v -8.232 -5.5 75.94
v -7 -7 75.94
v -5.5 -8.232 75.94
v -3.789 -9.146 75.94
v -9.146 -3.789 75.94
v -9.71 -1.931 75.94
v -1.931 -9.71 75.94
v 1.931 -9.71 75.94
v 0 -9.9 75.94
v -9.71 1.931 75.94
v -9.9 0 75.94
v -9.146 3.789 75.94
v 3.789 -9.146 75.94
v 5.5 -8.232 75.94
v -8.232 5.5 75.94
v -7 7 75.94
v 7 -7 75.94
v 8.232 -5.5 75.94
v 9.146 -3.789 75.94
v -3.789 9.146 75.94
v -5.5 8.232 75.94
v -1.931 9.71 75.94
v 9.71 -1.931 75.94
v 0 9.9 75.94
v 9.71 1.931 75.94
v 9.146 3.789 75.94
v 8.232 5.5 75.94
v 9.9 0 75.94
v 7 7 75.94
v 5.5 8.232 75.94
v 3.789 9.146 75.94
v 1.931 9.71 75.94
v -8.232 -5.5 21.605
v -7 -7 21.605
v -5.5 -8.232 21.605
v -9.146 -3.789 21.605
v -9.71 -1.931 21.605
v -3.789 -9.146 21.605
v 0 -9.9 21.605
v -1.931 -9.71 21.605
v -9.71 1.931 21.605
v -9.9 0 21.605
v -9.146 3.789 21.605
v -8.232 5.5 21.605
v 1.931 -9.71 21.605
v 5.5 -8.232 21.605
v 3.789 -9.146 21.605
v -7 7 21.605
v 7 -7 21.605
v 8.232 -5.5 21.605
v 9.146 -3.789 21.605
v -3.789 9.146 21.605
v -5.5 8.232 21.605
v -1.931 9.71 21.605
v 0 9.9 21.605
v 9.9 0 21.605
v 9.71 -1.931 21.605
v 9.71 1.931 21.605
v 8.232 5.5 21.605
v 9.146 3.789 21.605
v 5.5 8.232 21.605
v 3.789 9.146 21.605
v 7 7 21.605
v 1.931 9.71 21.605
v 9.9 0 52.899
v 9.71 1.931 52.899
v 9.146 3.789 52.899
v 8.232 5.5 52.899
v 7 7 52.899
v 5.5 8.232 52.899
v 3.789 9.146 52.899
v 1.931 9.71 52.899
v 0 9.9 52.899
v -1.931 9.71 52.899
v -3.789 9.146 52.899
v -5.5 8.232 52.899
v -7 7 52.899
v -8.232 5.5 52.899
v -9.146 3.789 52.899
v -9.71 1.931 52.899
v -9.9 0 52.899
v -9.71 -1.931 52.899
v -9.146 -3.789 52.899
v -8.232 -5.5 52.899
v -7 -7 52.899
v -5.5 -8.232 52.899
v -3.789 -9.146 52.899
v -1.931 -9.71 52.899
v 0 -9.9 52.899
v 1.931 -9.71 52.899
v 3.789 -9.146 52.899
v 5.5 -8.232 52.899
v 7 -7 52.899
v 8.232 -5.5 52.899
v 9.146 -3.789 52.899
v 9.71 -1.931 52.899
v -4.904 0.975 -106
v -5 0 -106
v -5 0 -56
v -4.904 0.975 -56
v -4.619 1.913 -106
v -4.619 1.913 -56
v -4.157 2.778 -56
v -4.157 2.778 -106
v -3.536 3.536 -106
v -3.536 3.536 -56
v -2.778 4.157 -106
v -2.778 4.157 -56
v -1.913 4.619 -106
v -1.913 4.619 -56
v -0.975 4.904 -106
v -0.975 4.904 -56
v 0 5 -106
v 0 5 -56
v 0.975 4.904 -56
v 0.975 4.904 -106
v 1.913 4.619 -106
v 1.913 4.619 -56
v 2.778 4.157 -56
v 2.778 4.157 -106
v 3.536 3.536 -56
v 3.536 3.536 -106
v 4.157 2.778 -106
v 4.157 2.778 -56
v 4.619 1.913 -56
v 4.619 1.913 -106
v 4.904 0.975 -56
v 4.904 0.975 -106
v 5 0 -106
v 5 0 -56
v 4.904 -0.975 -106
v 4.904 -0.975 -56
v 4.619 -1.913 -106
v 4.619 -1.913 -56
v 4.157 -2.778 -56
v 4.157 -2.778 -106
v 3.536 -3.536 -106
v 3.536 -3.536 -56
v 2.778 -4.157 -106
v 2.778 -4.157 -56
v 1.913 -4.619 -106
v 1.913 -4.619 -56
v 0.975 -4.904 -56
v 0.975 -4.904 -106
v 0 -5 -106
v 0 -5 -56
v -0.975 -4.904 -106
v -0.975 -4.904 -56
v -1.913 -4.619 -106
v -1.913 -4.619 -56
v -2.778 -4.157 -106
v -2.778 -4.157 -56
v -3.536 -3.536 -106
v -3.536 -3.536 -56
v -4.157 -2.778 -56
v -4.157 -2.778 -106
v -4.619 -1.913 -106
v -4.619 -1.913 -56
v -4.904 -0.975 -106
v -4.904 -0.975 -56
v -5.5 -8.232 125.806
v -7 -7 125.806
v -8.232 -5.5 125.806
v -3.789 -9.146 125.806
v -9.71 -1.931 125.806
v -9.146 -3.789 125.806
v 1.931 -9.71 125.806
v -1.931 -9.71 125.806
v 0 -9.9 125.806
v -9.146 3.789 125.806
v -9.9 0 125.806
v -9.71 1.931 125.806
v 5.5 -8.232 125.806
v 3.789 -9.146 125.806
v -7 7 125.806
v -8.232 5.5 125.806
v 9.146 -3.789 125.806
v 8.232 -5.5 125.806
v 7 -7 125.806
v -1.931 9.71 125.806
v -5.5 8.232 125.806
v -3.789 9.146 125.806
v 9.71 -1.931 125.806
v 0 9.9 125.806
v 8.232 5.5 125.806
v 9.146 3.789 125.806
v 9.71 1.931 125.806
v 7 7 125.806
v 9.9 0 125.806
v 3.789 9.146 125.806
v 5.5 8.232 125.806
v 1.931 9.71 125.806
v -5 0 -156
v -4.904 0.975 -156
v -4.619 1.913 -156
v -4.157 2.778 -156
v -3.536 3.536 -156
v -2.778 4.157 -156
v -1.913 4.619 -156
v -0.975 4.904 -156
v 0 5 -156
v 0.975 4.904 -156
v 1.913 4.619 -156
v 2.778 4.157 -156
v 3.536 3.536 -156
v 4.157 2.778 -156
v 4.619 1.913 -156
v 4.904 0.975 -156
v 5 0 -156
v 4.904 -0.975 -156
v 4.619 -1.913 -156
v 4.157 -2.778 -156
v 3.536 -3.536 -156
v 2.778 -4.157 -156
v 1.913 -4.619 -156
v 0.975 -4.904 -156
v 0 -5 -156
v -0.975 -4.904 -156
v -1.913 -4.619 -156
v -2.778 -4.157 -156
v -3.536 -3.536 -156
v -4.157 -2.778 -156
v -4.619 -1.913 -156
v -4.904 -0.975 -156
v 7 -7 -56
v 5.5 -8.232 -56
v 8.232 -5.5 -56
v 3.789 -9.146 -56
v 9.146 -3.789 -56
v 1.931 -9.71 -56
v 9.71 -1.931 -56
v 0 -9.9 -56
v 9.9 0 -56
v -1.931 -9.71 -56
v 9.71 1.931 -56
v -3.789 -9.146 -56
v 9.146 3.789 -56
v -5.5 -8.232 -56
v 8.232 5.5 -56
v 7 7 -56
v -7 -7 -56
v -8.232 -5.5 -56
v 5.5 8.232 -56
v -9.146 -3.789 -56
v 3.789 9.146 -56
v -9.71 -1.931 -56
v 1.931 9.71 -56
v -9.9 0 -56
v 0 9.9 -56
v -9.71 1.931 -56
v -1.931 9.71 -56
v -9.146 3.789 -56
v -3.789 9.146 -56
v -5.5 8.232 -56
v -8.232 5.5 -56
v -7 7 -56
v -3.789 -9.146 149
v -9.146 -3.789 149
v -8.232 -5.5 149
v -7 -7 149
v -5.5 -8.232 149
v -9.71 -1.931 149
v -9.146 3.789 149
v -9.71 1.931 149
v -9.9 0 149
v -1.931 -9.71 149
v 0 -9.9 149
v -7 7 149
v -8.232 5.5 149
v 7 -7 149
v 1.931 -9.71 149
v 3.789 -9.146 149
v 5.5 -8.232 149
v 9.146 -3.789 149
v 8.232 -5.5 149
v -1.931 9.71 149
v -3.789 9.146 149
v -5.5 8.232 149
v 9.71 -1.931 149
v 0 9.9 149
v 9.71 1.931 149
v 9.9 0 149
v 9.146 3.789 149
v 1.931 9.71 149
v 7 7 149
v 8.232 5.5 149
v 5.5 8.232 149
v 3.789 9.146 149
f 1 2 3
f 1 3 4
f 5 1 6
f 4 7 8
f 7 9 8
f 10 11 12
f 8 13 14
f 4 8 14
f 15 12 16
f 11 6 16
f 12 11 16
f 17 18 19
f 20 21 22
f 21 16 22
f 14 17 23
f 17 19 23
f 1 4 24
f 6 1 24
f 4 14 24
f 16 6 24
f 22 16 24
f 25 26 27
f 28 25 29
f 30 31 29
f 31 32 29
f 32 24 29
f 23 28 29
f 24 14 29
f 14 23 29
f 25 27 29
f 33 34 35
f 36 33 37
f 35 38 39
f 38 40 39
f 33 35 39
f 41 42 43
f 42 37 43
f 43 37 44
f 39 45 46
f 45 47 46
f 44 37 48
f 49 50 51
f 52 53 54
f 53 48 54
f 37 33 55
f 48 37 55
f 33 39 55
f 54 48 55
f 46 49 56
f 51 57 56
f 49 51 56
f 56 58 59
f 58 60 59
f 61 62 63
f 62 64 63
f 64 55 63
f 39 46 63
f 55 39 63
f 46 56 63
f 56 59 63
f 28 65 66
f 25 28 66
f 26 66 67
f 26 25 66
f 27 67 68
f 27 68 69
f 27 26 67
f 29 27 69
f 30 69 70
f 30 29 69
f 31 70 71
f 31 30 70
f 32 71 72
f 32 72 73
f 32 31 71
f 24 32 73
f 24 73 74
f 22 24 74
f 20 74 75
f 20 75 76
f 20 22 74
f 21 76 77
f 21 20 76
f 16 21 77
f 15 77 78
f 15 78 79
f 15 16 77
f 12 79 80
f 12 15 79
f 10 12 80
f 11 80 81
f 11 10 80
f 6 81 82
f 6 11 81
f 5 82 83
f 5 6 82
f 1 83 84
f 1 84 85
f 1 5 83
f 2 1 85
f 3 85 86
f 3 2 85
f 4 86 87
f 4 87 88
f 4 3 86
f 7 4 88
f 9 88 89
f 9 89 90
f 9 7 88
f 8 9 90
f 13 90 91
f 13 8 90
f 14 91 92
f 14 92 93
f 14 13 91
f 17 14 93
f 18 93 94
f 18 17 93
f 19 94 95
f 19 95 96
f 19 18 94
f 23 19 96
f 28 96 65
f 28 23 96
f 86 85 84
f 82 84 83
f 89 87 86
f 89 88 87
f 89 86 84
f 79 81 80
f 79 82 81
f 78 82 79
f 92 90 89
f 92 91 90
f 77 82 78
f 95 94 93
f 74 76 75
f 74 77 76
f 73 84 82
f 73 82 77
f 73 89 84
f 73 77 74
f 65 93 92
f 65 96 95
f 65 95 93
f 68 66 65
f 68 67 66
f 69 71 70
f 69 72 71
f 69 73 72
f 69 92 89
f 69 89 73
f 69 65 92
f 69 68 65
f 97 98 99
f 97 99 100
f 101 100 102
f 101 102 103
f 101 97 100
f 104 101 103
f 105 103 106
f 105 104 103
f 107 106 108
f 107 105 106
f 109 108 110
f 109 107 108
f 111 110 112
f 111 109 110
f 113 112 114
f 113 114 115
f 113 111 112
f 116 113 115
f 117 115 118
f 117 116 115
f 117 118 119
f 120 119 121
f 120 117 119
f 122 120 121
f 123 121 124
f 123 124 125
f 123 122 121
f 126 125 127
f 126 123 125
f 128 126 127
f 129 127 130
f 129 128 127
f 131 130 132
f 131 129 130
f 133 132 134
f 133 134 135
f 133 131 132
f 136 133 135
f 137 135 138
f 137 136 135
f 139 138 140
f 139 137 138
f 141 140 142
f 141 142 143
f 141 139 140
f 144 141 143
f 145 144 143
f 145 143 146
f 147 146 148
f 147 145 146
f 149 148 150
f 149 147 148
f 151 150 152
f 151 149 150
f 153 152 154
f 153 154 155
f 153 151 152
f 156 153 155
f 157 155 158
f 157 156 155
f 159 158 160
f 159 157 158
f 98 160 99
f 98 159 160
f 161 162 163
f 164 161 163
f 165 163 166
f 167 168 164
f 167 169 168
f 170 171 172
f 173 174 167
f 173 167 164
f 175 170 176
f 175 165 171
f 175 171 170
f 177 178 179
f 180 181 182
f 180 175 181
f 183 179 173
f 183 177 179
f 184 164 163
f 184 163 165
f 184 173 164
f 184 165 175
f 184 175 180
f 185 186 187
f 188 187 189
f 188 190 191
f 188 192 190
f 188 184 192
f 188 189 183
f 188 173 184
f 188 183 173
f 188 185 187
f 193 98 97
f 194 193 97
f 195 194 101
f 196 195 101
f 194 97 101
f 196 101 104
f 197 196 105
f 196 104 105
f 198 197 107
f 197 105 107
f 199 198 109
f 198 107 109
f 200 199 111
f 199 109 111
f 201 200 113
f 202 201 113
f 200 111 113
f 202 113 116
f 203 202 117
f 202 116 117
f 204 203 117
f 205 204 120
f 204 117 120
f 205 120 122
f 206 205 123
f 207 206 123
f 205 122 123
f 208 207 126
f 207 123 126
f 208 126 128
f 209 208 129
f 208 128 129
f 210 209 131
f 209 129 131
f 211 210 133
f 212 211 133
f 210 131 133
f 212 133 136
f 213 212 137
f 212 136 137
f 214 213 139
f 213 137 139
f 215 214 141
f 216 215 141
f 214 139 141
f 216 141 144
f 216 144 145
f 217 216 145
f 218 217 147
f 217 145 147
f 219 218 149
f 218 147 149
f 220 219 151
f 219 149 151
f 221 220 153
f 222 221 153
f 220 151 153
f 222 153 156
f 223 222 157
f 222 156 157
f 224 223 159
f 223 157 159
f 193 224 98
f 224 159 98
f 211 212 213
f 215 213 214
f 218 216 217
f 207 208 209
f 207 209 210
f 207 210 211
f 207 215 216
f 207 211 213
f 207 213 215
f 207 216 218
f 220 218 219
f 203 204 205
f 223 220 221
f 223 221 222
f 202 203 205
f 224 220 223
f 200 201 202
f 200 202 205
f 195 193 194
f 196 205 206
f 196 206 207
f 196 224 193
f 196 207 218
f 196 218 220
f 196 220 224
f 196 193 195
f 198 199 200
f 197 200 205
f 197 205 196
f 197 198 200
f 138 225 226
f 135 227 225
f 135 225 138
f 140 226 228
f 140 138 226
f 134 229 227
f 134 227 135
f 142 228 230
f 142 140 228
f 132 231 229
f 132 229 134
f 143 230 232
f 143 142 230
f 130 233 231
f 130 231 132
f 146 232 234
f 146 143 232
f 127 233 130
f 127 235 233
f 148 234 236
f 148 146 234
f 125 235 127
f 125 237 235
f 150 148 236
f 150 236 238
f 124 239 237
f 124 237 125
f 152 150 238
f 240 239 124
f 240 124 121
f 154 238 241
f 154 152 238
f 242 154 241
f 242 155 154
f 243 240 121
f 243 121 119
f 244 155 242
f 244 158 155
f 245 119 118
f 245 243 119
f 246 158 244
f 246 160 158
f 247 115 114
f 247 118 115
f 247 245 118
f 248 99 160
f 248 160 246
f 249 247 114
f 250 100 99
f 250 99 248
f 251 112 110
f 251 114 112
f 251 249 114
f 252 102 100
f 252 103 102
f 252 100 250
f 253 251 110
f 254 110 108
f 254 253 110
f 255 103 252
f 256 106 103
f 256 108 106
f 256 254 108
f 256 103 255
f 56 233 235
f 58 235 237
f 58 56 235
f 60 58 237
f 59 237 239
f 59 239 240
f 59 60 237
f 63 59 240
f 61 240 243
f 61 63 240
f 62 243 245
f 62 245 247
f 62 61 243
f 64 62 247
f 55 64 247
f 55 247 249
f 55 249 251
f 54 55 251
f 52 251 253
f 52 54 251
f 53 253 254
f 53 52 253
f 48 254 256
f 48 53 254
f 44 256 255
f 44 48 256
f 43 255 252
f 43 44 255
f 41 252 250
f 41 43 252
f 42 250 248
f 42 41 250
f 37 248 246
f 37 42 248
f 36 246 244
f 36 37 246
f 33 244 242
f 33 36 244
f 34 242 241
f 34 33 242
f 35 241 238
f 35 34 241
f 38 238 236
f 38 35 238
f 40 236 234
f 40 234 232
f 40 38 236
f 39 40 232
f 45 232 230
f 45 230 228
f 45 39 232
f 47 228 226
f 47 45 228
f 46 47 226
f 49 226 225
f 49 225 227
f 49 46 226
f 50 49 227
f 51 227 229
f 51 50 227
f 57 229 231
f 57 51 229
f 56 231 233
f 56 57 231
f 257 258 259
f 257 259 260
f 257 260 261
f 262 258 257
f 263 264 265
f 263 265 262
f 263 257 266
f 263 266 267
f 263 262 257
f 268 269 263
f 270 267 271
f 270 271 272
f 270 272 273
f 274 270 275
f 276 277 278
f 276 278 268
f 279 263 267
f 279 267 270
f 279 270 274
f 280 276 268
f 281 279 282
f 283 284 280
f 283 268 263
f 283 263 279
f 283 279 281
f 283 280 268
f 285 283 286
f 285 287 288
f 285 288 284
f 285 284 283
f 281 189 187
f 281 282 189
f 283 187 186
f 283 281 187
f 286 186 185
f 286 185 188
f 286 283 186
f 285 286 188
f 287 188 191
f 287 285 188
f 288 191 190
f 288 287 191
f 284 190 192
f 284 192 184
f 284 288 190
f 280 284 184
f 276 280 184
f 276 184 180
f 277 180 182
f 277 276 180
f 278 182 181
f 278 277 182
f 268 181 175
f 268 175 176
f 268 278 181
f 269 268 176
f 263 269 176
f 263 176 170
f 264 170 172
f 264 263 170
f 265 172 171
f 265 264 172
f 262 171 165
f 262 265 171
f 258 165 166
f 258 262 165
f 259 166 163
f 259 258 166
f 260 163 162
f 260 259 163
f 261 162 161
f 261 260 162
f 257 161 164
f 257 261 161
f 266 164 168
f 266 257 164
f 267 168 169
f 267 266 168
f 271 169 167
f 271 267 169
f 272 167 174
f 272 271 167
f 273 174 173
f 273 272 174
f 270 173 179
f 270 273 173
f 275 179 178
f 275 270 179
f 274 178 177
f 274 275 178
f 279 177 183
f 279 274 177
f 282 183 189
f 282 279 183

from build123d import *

# Parameters (mm, degrees)
IZIM1_R                          = 9.9
Y_KSEKLIK_EKSTR_ZYON1_DEPTH      = 149
Y_KSEKLIK_EKSTR_ZYON1_DEPTH_BACK = 106
IZIM4_R                          = 9.9
IZIM4_R_2                        = 5
KES_EKSTR_ZYON4_DEPTH            = 50
SKETCH1_R                        = 5
BOSS_EXTRUDE1_DEPTH              = 50
SKETCH2_W                        = 49.865172684
SKETCH2_H                        = 45.050604287
SKETCH2_W_2                      = 31.294694581
SKETCH2_H_2                      = 47.113990743
CUT_EXTRUDE1_DEPTH               = 110


with BuildPart() as part:
    # Çizim1 → Yükseklik-Ekstrüzyon1 (new body, two sides)
    with BuildSketch(Plane.XY) as y_kseklik_ekstr_zyon1_sk:
        Circle(IZIM1_R)
    extrude(amount=Y_KSEKLIK_EKSTR_ZYON1_DEPTH)
    extrude(y_kseklik_ekstr_zyon1_sk.sketch, amount=-Y_KSEKLIK_EKSTR_ZYON1_DEPTH_BACK)

    # Çizim4 → Kes-Ekstrüzyon4 (cut)
    with BuildSketch(Plane(origin=(0, 0, -106), x_dir=(-1, 0, 0), z_dir=(0, 0, -1))):
        Circle(IZIM4_R)
        Circle(IZIM4_R_2, mode=Mode.SUBTRACT)
    extrude(amount=-KES_EKSTR_ZYON4_DEPTH, mode=Mode.SUBTRACT)

    # Sketch1 → Boss-Extrude1 (add)
    with BuildSketch(Plane(origin=(0, 0, -106), x_dir=(-1, 0, 0), z_dir=(0, 0, -1))):
        Circle(SKETCH1_R)
    extrude(amount=BOSS_EXTRUDE1_DEPTH)

    # Sketch2 → Cut-Extrude1 (cut)
    with BuildSketch(Plane(origin=(30, 0, 0), x_dir=(0, 0, -1), z_dir=(1, 0, 0))):
        with Locations((-100.872964895, -1.891437585)):
            Rectangle(SKETCH2_W, SKETCH2_H)
        with Locations((-37.251882505, -2.923130813)):
            Rectangle(SKETCH2_W_2, SKETCH2_H_2)
    extrude(amount=-CUT_EXTRUDE1_DEPTH, mode=Mode.SUBTRACT)


solid = part.part
